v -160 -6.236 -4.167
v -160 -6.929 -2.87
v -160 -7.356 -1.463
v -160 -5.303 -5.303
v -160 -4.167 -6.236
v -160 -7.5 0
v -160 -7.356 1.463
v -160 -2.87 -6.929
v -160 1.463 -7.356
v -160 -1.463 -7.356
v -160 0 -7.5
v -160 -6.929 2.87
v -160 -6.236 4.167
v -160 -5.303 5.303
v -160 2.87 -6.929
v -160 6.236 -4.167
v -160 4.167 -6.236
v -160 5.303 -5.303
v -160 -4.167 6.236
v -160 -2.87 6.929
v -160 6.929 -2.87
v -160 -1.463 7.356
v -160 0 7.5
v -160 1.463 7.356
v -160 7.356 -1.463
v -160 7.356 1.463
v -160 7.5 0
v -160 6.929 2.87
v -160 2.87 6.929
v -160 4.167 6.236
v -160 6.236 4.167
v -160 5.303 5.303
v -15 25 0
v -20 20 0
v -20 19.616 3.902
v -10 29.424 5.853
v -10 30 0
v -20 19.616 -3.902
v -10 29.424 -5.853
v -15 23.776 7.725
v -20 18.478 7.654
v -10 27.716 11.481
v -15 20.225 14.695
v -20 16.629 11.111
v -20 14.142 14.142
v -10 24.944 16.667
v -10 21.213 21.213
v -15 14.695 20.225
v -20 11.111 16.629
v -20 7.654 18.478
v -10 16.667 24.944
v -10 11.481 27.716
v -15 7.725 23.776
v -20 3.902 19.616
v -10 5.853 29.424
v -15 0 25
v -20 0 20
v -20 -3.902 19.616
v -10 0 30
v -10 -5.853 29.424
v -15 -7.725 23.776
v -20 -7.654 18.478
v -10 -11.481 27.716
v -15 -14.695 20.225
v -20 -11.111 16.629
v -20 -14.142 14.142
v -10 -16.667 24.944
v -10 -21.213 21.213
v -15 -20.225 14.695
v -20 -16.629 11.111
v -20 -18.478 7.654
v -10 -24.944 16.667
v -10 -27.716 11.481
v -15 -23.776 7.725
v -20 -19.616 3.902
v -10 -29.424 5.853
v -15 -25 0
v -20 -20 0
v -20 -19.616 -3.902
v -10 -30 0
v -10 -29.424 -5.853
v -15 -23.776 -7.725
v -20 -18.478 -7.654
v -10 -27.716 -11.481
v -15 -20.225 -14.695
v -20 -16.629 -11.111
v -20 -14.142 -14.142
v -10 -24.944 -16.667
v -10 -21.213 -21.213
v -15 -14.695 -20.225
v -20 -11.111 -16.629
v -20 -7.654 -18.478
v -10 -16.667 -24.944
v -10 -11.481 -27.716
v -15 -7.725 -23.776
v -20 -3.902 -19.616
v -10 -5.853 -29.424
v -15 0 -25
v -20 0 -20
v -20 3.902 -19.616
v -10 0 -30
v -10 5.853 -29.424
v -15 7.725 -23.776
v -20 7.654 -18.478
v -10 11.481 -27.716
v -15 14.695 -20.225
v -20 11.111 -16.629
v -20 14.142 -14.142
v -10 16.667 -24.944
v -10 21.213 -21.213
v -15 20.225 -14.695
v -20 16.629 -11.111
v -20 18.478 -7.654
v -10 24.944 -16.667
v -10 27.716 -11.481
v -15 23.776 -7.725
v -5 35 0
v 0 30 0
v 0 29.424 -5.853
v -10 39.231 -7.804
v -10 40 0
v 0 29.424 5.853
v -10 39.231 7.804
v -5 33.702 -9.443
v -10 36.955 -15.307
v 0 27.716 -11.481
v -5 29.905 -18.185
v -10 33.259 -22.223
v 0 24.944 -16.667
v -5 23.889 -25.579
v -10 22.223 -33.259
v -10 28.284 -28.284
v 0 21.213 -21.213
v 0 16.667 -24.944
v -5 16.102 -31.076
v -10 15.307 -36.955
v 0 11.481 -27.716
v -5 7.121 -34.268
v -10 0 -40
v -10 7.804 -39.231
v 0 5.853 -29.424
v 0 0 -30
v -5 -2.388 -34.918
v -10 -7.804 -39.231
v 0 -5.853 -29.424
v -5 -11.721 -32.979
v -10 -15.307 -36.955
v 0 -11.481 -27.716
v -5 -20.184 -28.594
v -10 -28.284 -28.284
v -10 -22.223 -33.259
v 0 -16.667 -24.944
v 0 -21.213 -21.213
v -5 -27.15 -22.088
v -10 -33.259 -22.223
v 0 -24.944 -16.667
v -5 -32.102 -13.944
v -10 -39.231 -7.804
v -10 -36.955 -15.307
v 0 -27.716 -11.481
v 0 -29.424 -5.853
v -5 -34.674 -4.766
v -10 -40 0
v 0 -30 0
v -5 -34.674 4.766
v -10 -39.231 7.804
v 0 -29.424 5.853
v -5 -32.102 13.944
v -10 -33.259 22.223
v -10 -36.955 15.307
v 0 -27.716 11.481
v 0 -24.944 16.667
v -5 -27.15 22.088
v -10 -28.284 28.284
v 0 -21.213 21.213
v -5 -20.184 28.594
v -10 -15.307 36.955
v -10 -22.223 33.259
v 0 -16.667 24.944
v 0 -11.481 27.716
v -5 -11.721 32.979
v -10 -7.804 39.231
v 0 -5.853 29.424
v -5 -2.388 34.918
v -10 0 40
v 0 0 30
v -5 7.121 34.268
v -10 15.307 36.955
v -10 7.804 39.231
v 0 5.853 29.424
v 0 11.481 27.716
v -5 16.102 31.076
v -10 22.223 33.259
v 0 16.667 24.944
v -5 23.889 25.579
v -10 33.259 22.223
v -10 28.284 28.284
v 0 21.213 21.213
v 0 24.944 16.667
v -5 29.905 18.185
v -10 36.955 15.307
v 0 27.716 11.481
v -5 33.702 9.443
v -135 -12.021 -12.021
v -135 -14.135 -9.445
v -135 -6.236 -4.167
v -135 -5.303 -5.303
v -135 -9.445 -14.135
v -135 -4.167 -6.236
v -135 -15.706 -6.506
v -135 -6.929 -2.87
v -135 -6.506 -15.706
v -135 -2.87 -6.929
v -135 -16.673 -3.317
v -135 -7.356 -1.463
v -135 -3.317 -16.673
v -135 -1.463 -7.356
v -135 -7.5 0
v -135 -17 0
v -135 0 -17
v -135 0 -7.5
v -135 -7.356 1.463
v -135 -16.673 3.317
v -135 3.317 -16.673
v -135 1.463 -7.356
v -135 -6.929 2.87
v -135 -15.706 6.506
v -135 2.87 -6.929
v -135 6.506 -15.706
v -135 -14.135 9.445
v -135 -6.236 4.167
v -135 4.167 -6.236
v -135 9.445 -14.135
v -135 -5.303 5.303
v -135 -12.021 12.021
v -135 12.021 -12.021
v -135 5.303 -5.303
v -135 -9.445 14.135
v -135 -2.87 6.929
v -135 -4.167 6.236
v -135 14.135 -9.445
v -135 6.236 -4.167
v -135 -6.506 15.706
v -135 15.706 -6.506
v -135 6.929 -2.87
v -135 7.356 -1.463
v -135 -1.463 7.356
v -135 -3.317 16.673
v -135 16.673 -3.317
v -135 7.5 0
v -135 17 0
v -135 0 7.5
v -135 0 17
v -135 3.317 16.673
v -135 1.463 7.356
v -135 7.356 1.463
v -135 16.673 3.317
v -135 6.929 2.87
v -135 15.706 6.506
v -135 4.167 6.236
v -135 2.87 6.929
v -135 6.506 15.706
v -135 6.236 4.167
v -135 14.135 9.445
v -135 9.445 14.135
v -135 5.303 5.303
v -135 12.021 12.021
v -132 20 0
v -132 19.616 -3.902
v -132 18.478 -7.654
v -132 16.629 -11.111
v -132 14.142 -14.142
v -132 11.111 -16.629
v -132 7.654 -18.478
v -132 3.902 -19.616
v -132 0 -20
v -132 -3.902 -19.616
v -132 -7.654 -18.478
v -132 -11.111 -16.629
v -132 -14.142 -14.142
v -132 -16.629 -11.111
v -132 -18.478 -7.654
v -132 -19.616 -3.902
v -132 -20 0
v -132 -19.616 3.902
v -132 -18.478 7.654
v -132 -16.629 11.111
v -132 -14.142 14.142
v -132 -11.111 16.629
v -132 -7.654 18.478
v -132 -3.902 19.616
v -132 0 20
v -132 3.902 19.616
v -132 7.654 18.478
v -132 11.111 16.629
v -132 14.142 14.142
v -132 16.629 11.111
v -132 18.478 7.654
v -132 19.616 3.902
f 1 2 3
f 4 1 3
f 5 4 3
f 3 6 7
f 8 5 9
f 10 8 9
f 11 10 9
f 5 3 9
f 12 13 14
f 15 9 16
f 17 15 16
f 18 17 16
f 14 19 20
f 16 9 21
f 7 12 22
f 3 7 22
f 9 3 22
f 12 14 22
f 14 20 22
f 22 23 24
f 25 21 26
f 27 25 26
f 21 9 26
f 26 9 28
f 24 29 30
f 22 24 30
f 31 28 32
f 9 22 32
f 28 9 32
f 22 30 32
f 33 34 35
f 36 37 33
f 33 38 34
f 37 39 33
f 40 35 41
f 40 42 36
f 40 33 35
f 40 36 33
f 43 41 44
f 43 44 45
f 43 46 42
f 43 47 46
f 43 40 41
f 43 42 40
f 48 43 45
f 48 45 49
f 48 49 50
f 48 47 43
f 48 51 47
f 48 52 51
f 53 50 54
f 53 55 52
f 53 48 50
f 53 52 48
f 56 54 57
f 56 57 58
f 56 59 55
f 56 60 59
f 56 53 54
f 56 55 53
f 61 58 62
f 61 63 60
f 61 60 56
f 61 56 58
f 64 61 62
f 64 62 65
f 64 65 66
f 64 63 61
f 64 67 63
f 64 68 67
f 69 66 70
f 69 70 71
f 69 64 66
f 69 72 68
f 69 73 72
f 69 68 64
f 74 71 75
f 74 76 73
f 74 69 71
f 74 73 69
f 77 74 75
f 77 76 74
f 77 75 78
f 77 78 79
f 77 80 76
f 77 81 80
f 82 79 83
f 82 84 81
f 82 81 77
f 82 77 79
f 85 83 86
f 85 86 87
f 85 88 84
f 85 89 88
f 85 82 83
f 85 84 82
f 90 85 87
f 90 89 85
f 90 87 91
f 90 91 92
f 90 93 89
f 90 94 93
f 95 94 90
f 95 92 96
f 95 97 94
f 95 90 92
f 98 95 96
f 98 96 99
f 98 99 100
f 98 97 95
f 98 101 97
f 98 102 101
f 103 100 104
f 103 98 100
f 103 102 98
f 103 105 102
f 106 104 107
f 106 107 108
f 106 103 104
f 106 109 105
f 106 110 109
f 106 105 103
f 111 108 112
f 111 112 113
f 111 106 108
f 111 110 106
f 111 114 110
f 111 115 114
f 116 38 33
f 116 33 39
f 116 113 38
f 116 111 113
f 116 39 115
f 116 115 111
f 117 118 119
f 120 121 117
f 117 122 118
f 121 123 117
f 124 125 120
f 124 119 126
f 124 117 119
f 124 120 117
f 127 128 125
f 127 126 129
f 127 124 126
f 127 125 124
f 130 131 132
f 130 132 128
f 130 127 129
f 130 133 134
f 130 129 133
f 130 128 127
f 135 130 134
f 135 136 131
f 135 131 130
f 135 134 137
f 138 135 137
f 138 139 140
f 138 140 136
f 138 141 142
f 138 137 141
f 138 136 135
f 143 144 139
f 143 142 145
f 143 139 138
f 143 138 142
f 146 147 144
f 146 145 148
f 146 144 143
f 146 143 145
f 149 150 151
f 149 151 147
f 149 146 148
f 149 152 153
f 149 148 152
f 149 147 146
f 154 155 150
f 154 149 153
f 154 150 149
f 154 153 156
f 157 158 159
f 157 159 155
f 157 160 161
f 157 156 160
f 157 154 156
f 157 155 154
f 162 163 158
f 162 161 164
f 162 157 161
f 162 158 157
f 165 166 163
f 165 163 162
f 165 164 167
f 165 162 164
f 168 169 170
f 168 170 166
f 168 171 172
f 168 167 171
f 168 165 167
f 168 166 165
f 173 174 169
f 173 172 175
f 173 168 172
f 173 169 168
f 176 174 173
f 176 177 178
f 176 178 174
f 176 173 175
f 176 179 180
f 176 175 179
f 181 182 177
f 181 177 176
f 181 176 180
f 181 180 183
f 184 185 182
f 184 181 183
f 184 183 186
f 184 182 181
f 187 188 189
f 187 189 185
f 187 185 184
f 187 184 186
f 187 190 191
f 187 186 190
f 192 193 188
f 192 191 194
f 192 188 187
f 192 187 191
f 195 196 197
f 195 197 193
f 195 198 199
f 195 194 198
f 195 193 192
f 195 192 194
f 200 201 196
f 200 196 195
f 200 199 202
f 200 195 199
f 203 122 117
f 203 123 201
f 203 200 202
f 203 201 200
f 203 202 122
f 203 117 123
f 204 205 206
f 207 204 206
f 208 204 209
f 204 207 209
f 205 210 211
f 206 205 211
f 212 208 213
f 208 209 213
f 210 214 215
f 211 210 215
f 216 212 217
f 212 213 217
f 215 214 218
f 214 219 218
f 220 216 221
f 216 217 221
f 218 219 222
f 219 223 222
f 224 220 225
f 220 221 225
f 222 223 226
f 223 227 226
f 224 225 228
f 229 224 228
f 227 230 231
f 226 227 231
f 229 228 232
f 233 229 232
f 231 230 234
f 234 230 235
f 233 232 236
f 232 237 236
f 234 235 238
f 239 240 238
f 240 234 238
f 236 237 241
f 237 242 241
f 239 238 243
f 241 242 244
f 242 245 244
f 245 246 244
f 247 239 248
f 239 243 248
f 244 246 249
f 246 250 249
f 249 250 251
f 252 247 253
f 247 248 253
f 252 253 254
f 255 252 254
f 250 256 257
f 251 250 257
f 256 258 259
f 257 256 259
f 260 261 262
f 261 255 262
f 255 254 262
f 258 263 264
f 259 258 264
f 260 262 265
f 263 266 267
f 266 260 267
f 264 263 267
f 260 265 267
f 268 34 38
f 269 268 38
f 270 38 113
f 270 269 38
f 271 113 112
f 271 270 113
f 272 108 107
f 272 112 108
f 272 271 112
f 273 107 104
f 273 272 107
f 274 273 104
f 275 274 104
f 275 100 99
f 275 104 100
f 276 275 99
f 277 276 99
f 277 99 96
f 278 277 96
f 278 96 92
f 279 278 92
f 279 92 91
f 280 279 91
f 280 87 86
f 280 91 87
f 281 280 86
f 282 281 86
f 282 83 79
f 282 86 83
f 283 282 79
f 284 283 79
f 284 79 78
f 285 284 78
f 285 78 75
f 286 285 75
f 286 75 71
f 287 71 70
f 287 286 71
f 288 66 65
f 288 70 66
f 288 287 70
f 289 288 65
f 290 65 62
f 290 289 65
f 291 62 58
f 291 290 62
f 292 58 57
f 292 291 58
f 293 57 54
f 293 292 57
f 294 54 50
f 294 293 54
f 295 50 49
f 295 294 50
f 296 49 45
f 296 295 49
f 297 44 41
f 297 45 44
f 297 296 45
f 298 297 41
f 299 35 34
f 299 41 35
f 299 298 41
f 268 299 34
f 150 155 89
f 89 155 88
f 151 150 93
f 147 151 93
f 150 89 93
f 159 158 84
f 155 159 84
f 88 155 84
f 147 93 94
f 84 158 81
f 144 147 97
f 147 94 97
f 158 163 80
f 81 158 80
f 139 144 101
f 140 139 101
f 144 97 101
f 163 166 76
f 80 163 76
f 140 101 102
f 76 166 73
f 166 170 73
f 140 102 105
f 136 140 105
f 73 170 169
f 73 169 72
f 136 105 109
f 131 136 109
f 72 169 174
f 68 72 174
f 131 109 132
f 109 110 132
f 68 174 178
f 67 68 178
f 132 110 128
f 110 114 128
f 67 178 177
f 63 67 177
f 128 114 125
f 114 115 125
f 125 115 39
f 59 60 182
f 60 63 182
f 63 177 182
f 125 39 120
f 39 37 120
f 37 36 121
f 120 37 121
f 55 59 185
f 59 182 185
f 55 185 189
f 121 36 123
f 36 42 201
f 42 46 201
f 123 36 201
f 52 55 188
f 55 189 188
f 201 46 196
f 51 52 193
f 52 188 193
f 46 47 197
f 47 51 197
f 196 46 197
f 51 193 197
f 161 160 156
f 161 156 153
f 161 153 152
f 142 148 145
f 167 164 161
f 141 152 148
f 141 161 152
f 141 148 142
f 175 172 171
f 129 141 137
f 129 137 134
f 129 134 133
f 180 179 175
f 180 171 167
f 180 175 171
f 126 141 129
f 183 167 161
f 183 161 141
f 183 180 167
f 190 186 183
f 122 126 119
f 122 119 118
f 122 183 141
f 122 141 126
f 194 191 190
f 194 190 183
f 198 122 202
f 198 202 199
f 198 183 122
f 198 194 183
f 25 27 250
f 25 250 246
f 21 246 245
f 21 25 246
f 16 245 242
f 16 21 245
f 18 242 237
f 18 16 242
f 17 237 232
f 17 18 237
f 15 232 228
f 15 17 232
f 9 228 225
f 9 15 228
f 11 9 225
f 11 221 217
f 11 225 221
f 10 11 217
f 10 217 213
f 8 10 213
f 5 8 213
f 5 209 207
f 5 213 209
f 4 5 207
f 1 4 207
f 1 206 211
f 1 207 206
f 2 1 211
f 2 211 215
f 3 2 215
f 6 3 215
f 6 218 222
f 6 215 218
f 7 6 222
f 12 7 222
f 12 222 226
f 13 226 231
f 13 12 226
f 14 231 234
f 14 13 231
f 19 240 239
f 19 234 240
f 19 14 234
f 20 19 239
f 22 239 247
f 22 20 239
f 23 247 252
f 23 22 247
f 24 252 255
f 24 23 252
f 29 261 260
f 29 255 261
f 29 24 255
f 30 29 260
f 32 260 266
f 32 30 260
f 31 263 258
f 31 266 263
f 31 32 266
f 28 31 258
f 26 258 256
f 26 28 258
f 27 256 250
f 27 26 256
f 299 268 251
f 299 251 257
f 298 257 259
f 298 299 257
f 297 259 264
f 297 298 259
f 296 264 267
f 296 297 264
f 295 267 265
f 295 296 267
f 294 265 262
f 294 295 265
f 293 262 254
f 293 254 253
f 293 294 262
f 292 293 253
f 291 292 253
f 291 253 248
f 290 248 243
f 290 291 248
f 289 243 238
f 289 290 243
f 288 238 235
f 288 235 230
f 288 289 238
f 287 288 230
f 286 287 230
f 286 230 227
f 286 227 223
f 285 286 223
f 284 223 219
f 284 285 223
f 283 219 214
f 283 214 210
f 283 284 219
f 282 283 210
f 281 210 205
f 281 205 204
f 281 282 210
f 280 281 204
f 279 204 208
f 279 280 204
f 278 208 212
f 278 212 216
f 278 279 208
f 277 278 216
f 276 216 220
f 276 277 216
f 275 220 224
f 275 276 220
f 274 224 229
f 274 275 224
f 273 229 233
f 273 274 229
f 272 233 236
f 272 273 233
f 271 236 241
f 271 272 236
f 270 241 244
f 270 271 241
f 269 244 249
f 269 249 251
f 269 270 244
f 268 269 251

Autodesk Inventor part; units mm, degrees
ref_plane "YZ Plane" through (0, 0, 0) normal (1, 0, 0) x (0, 1, 0)
ref_plane "XZ Plane" through (0, 0, 0) normal (0, 1, 0) x (-1, 0, 0)
ref_plane "XY Plane" through (0, 0, 0) normal (0, 0, 1) x (1, 0, 0)
sketch "草圖1" plane through (0, 0, 0) normal (0, 0, 1) x (1, 0, 0)
  line L0 (0, 0) -> (0, 30)
  line L1 (-10, 30) -> (-20, 20)
  line L2 (-20, 20) -> (-132, 20)
  line L3 (-132, 20) -> (-135, 17)
  line L4 (-135, 17) -> (-135, 7.5)
  line L5 (-135, 7.5) -> (-160, 7.5)
  line L6 (-160, 7.5) -> (-160, 0)
  line L7 (-160, 0) -> (0, 0)
  line L8 (-10, 30) -> (-10, 40)
  line L9 (-10, 40) -> (0, 30)
  dimension "d3" = 45
  dimension "d4" = 150
  dimension "d5" = 7.5
  dimension "d6" = 25
  dimension "d7" = 45
  dimension "d8" = 3
  dimension "d9" = 20
  dimension "d10" = 160
  dimension "d11" = 40
  dimension "d12" = 10
revolve "迴轉1" add sketch "草圖1" angle 360 about axis through (-160, 0, 0) along (1, 0, 0)
properties part number "2-2-2"
